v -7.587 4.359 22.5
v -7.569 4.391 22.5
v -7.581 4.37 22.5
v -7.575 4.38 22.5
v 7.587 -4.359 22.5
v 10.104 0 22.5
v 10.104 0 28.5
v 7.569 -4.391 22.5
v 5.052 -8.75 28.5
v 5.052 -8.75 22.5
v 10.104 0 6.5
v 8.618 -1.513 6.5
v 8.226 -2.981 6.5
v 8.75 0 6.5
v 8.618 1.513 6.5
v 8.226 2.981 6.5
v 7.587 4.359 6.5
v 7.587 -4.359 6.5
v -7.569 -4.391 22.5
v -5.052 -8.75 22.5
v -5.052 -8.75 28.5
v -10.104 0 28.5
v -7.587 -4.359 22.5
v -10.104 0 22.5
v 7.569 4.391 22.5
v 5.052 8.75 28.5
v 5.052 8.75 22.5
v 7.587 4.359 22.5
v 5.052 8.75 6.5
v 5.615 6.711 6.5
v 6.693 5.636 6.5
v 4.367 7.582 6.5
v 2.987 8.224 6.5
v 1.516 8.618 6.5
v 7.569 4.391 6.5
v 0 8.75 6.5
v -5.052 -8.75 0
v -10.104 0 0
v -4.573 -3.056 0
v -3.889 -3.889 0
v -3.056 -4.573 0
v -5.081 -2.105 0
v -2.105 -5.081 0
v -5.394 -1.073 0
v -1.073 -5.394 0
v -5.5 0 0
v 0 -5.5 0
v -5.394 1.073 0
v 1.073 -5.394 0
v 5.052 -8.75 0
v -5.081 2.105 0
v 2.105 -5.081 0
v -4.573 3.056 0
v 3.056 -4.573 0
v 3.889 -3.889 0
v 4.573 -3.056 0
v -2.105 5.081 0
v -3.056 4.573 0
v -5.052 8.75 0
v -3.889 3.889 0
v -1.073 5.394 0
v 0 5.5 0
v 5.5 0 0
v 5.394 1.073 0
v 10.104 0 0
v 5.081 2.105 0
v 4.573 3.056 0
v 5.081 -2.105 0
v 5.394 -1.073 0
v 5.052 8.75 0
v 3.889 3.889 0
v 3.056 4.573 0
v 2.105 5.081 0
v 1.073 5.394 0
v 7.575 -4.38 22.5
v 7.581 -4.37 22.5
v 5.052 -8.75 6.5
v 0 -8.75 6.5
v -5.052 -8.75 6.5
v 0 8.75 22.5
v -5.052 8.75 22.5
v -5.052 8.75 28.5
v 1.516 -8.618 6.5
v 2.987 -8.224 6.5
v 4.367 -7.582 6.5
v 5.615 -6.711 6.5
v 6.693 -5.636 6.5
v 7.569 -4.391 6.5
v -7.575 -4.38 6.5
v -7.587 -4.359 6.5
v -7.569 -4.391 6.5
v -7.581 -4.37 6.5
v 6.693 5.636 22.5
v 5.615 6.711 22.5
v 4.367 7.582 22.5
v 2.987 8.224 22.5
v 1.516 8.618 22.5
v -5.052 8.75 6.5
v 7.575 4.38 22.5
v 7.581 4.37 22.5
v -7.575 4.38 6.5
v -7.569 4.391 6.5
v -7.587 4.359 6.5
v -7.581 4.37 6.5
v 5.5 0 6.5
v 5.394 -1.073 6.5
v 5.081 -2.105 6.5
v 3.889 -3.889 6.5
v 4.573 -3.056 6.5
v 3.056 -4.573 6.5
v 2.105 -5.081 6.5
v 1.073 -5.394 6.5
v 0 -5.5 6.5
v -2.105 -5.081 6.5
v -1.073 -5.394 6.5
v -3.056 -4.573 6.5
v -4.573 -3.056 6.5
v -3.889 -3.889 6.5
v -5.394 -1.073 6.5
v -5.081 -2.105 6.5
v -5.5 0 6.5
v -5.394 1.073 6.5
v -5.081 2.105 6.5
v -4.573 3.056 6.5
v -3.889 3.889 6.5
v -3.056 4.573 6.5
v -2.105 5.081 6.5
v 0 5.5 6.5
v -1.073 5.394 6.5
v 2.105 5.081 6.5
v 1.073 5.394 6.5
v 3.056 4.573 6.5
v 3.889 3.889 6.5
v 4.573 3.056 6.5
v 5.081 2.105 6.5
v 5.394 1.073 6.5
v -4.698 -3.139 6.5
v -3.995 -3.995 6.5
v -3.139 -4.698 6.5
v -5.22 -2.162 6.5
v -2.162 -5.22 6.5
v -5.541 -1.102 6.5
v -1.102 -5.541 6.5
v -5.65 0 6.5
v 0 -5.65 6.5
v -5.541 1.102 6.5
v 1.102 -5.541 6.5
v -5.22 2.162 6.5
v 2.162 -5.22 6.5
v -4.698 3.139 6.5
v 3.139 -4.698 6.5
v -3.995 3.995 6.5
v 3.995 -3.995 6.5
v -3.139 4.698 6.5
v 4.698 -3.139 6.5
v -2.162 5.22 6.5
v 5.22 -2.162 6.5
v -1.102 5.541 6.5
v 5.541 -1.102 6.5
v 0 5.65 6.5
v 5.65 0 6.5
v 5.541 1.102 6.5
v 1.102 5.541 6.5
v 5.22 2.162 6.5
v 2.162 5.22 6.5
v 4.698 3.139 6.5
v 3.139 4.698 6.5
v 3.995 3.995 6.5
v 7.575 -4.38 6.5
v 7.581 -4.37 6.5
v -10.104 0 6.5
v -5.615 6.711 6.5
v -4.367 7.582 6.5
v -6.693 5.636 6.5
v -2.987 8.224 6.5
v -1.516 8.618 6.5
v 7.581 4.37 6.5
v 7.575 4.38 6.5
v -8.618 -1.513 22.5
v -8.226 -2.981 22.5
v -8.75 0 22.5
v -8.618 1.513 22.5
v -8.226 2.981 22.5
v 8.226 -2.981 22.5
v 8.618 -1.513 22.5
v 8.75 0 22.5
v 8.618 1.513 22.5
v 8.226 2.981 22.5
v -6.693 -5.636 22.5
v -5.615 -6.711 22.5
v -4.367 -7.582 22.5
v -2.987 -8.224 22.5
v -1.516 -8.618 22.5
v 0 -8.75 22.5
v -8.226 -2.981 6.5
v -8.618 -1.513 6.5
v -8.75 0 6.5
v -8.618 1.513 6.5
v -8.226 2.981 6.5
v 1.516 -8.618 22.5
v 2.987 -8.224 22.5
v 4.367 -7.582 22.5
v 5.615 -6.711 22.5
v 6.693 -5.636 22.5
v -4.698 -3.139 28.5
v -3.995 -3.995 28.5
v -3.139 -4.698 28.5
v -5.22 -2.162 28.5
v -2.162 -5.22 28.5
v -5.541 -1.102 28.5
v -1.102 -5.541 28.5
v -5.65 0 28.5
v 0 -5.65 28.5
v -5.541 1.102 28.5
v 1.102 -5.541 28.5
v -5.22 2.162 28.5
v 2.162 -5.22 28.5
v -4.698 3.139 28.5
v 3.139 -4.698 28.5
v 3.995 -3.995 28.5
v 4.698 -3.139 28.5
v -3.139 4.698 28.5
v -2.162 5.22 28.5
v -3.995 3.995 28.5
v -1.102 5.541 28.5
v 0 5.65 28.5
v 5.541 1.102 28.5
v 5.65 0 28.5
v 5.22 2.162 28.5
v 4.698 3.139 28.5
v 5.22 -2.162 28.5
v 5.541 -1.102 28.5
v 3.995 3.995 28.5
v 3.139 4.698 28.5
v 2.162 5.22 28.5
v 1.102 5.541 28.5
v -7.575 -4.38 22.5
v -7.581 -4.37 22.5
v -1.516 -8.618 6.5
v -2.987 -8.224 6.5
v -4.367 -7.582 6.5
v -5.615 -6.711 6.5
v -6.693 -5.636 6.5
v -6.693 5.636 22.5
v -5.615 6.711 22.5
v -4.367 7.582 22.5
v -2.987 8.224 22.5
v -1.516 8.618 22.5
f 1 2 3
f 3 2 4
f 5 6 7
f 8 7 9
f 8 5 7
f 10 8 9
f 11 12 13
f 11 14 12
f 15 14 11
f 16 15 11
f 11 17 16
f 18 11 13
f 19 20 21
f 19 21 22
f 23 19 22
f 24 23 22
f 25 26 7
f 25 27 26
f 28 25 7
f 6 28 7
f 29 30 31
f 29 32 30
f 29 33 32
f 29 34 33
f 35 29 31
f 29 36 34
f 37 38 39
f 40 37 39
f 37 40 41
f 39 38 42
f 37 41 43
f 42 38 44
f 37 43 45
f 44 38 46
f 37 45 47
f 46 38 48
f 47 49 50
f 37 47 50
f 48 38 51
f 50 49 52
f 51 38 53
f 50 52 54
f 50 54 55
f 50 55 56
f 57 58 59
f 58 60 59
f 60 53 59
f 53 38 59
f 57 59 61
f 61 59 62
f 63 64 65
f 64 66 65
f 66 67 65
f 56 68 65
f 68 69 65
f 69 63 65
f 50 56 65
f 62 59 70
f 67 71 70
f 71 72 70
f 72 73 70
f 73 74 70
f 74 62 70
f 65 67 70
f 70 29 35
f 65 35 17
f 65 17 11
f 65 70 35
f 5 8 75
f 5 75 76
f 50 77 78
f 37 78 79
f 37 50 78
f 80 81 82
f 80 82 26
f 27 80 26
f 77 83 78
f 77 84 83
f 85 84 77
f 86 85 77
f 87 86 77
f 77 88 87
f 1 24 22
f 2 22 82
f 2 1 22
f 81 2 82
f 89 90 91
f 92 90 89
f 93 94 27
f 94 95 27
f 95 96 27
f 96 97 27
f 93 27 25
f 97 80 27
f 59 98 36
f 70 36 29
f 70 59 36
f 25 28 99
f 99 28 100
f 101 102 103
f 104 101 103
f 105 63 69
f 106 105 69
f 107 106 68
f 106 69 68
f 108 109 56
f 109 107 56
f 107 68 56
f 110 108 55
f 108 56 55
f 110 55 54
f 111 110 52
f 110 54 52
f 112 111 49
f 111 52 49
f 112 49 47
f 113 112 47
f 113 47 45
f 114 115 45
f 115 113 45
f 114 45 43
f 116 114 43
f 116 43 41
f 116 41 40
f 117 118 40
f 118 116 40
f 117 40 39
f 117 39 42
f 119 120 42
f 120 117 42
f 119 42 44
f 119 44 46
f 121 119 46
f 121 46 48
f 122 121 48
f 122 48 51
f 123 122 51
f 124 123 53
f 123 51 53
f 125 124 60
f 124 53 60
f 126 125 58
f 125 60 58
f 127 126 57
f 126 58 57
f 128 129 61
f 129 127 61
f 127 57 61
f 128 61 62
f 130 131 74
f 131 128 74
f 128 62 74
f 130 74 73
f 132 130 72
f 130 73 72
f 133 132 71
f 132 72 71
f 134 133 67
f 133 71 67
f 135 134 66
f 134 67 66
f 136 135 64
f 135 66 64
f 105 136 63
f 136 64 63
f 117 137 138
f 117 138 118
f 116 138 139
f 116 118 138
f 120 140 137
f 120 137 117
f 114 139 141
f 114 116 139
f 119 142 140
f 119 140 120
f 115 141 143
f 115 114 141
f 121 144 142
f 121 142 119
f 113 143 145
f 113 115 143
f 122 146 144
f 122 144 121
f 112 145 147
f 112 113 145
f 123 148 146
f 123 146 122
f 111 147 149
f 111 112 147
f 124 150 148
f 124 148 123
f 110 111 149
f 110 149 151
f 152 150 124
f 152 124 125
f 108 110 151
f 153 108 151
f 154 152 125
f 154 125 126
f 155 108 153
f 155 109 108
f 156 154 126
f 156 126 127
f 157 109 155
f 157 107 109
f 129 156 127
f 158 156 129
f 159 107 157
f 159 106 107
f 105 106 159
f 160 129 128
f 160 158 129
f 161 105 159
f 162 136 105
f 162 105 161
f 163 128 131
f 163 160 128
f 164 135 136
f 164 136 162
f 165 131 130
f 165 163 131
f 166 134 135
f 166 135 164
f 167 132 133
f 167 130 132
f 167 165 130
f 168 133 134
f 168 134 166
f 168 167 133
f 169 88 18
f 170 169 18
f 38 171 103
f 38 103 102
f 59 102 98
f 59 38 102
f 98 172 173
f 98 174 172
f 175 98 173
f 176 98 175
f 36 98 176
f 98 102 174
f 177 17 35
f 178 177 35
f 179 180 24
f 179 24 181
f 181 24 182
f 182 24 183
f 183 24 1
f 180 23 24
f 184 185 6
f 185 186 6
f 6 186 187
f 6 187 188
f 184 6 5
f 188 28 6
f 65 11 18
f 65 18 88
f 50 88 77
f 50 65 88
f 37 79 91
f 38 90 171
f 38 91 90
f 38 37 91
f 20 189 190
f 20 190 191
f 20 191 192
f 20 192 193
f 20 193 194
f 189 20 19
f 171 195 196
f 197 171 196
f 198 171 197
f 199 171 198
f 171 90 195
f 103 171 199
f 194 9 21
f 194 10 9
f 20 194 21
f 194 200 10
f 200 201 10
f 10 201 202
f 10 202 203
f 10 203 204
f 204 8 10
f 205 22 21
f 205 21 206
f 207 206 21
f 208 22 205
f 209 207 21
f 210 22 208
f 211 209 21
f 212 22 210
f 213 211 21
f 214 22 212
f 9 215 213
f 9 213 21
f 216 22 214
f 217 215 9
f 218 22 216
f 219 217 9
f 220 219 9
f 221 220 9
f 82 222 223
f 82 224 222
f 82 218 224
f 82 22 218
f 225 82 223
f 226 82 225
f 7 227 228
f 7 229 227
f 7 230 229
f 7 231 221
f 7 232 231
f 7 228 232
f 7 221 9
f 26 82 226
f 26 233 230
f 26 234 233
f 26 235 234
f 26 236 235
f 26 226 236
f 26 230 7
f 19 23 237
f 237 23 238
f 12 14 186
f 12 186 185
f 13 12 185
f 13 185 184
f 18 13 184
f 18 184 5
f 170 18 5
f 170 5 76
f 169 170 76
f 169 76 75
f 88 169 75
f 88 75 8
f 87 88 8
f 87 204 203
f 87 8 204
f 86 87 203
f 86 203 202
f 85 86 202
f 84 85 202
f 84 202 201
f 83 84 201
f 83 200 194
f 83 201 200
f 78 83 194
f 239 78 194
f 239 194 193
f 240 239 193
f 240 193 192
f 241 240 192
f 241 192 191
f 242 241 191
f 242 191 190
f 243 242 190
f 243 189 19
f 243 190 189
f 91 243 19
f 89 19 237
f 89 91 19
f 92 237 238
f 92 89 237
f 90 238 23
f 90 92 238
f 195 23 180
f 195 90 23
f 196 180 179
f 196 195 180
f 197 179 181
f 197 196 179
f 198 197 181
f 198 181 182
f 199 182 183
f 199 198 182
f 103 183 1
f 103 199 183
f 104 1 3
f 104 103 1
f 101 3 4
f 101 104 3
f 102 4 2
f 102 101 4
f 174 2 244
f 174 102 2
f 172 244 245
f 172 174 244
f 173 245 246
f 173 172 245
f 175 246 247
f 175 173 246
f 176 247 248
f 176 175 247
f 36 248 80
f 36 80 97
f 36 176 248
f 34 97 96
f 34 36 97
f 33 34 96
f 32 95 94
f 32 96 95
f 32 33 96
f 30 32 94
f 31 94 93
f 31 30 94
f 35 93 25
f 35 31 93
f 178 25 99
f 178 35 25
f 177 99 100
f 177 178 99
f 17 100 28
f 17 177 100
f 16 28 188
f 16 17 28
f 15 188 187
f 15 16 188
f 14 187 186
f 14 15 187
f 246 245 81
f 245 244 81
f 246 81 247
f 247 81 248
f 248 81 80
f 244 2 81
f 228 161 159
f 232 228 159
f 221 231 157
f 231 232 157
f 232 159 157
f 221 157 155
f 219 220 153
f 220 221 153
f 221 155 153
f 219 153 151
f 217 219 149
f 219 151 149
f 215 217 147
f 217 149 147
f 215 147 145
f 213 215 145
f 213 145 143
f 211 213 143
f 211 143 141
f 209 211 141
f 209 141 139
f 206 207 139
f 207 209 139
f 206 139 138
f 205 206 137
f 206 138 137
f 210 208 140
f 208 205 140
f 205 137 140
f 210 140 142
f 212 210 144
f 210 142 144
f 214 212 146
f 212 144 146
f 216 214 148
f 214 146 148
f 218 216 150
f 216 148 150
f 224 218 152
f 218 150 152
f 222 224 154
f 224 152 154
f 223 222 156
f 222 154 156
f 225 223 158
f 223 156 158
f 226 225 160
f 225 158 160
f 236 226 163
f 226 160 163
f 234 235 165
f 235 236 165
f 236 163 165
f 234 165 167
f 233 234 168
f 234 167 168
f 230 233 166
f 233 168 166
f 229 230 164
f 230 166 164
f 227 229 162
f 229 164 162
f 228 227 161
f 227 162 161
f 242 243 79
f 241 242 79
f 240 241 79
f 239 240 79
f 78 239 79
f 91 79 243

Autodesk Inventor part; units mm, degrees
ref_plane "YZ Plane" through (0, 0, 0) normal (1, 0, 0) x (0, 1, 0)
ref_plane "XZ Plane" through (0, 0, 0) normal (0, 1, 0) x (-1, 0, 0)
ref_plane "XY Plane" through (0, 0, 0) normal (0, 0, 1) x (1, 0, 0)
sketch "Sketch1" plane through (0, 0, 0) normal (0, 0, 1) x (1, 0, 0)
  line L0 (10.1036, 0) -> (5.0518, -8.75)
  line L1 (5.0518, -8.75) -> (-5.0518, -8.75)
  line L2 (-5.0518, -8.75) -> (-10.1036, 0)
  line L3 (-10.1036, 0) -> (-5.0518, 8.75)
  line L4 (-5.0518, 8.75) -> (5.0518, 8.75)
  line L5 (5.0518, 8.75) -> (10.1036, 0)
  circle A0 centre (0, 0) radius 5.5
  dimension "d0" = 17.5
  dimension "d1" = 11
extrude "Extrusion1" add sketch "Sketch1" along normal blind 6.5
sketch "Sketch2" plane through (0, 0, 6.5) normal (0, 0, 1) x (1, 0, 0)
  circle A0 centre (0, 0) radius 8.75
  circle A1 centre (0, 0) radius 5.65
  dimension "d4" = 17.5
  dimension "d5" = 11.3
extrude "Extrusion2" add sketch "Sketch2" along normal blind 16
sketch "Sketch3" plane through (0, 0, 22.5) normal (0, 0, 1) x (1, 0, 0)
  circle A0 centre (0, 0) radius 5.65 projected
  line L0 (10.1036, 0) -> (5.0518, -8.75)
  line L1 (5.0518, -8.75) -> (-5.0518, -8.75)
  line L2 (-5.0518, -8.75) -> (-10.1036, 0)
  line L3 (-10.1036, 0) -> (-5.0518, 8.75)
  line L4 (-5.0518, 8.75) -> (5.0518, 8.75)
  line L5 (5.0518, 8.75) -> (10.1036, 0)
  dimension "d8" = 17.5
extrude "Extrusion3" add sketch "Sketch3" along normal blind 6
properties part number "AcopleIntermedio" material "Copper"
